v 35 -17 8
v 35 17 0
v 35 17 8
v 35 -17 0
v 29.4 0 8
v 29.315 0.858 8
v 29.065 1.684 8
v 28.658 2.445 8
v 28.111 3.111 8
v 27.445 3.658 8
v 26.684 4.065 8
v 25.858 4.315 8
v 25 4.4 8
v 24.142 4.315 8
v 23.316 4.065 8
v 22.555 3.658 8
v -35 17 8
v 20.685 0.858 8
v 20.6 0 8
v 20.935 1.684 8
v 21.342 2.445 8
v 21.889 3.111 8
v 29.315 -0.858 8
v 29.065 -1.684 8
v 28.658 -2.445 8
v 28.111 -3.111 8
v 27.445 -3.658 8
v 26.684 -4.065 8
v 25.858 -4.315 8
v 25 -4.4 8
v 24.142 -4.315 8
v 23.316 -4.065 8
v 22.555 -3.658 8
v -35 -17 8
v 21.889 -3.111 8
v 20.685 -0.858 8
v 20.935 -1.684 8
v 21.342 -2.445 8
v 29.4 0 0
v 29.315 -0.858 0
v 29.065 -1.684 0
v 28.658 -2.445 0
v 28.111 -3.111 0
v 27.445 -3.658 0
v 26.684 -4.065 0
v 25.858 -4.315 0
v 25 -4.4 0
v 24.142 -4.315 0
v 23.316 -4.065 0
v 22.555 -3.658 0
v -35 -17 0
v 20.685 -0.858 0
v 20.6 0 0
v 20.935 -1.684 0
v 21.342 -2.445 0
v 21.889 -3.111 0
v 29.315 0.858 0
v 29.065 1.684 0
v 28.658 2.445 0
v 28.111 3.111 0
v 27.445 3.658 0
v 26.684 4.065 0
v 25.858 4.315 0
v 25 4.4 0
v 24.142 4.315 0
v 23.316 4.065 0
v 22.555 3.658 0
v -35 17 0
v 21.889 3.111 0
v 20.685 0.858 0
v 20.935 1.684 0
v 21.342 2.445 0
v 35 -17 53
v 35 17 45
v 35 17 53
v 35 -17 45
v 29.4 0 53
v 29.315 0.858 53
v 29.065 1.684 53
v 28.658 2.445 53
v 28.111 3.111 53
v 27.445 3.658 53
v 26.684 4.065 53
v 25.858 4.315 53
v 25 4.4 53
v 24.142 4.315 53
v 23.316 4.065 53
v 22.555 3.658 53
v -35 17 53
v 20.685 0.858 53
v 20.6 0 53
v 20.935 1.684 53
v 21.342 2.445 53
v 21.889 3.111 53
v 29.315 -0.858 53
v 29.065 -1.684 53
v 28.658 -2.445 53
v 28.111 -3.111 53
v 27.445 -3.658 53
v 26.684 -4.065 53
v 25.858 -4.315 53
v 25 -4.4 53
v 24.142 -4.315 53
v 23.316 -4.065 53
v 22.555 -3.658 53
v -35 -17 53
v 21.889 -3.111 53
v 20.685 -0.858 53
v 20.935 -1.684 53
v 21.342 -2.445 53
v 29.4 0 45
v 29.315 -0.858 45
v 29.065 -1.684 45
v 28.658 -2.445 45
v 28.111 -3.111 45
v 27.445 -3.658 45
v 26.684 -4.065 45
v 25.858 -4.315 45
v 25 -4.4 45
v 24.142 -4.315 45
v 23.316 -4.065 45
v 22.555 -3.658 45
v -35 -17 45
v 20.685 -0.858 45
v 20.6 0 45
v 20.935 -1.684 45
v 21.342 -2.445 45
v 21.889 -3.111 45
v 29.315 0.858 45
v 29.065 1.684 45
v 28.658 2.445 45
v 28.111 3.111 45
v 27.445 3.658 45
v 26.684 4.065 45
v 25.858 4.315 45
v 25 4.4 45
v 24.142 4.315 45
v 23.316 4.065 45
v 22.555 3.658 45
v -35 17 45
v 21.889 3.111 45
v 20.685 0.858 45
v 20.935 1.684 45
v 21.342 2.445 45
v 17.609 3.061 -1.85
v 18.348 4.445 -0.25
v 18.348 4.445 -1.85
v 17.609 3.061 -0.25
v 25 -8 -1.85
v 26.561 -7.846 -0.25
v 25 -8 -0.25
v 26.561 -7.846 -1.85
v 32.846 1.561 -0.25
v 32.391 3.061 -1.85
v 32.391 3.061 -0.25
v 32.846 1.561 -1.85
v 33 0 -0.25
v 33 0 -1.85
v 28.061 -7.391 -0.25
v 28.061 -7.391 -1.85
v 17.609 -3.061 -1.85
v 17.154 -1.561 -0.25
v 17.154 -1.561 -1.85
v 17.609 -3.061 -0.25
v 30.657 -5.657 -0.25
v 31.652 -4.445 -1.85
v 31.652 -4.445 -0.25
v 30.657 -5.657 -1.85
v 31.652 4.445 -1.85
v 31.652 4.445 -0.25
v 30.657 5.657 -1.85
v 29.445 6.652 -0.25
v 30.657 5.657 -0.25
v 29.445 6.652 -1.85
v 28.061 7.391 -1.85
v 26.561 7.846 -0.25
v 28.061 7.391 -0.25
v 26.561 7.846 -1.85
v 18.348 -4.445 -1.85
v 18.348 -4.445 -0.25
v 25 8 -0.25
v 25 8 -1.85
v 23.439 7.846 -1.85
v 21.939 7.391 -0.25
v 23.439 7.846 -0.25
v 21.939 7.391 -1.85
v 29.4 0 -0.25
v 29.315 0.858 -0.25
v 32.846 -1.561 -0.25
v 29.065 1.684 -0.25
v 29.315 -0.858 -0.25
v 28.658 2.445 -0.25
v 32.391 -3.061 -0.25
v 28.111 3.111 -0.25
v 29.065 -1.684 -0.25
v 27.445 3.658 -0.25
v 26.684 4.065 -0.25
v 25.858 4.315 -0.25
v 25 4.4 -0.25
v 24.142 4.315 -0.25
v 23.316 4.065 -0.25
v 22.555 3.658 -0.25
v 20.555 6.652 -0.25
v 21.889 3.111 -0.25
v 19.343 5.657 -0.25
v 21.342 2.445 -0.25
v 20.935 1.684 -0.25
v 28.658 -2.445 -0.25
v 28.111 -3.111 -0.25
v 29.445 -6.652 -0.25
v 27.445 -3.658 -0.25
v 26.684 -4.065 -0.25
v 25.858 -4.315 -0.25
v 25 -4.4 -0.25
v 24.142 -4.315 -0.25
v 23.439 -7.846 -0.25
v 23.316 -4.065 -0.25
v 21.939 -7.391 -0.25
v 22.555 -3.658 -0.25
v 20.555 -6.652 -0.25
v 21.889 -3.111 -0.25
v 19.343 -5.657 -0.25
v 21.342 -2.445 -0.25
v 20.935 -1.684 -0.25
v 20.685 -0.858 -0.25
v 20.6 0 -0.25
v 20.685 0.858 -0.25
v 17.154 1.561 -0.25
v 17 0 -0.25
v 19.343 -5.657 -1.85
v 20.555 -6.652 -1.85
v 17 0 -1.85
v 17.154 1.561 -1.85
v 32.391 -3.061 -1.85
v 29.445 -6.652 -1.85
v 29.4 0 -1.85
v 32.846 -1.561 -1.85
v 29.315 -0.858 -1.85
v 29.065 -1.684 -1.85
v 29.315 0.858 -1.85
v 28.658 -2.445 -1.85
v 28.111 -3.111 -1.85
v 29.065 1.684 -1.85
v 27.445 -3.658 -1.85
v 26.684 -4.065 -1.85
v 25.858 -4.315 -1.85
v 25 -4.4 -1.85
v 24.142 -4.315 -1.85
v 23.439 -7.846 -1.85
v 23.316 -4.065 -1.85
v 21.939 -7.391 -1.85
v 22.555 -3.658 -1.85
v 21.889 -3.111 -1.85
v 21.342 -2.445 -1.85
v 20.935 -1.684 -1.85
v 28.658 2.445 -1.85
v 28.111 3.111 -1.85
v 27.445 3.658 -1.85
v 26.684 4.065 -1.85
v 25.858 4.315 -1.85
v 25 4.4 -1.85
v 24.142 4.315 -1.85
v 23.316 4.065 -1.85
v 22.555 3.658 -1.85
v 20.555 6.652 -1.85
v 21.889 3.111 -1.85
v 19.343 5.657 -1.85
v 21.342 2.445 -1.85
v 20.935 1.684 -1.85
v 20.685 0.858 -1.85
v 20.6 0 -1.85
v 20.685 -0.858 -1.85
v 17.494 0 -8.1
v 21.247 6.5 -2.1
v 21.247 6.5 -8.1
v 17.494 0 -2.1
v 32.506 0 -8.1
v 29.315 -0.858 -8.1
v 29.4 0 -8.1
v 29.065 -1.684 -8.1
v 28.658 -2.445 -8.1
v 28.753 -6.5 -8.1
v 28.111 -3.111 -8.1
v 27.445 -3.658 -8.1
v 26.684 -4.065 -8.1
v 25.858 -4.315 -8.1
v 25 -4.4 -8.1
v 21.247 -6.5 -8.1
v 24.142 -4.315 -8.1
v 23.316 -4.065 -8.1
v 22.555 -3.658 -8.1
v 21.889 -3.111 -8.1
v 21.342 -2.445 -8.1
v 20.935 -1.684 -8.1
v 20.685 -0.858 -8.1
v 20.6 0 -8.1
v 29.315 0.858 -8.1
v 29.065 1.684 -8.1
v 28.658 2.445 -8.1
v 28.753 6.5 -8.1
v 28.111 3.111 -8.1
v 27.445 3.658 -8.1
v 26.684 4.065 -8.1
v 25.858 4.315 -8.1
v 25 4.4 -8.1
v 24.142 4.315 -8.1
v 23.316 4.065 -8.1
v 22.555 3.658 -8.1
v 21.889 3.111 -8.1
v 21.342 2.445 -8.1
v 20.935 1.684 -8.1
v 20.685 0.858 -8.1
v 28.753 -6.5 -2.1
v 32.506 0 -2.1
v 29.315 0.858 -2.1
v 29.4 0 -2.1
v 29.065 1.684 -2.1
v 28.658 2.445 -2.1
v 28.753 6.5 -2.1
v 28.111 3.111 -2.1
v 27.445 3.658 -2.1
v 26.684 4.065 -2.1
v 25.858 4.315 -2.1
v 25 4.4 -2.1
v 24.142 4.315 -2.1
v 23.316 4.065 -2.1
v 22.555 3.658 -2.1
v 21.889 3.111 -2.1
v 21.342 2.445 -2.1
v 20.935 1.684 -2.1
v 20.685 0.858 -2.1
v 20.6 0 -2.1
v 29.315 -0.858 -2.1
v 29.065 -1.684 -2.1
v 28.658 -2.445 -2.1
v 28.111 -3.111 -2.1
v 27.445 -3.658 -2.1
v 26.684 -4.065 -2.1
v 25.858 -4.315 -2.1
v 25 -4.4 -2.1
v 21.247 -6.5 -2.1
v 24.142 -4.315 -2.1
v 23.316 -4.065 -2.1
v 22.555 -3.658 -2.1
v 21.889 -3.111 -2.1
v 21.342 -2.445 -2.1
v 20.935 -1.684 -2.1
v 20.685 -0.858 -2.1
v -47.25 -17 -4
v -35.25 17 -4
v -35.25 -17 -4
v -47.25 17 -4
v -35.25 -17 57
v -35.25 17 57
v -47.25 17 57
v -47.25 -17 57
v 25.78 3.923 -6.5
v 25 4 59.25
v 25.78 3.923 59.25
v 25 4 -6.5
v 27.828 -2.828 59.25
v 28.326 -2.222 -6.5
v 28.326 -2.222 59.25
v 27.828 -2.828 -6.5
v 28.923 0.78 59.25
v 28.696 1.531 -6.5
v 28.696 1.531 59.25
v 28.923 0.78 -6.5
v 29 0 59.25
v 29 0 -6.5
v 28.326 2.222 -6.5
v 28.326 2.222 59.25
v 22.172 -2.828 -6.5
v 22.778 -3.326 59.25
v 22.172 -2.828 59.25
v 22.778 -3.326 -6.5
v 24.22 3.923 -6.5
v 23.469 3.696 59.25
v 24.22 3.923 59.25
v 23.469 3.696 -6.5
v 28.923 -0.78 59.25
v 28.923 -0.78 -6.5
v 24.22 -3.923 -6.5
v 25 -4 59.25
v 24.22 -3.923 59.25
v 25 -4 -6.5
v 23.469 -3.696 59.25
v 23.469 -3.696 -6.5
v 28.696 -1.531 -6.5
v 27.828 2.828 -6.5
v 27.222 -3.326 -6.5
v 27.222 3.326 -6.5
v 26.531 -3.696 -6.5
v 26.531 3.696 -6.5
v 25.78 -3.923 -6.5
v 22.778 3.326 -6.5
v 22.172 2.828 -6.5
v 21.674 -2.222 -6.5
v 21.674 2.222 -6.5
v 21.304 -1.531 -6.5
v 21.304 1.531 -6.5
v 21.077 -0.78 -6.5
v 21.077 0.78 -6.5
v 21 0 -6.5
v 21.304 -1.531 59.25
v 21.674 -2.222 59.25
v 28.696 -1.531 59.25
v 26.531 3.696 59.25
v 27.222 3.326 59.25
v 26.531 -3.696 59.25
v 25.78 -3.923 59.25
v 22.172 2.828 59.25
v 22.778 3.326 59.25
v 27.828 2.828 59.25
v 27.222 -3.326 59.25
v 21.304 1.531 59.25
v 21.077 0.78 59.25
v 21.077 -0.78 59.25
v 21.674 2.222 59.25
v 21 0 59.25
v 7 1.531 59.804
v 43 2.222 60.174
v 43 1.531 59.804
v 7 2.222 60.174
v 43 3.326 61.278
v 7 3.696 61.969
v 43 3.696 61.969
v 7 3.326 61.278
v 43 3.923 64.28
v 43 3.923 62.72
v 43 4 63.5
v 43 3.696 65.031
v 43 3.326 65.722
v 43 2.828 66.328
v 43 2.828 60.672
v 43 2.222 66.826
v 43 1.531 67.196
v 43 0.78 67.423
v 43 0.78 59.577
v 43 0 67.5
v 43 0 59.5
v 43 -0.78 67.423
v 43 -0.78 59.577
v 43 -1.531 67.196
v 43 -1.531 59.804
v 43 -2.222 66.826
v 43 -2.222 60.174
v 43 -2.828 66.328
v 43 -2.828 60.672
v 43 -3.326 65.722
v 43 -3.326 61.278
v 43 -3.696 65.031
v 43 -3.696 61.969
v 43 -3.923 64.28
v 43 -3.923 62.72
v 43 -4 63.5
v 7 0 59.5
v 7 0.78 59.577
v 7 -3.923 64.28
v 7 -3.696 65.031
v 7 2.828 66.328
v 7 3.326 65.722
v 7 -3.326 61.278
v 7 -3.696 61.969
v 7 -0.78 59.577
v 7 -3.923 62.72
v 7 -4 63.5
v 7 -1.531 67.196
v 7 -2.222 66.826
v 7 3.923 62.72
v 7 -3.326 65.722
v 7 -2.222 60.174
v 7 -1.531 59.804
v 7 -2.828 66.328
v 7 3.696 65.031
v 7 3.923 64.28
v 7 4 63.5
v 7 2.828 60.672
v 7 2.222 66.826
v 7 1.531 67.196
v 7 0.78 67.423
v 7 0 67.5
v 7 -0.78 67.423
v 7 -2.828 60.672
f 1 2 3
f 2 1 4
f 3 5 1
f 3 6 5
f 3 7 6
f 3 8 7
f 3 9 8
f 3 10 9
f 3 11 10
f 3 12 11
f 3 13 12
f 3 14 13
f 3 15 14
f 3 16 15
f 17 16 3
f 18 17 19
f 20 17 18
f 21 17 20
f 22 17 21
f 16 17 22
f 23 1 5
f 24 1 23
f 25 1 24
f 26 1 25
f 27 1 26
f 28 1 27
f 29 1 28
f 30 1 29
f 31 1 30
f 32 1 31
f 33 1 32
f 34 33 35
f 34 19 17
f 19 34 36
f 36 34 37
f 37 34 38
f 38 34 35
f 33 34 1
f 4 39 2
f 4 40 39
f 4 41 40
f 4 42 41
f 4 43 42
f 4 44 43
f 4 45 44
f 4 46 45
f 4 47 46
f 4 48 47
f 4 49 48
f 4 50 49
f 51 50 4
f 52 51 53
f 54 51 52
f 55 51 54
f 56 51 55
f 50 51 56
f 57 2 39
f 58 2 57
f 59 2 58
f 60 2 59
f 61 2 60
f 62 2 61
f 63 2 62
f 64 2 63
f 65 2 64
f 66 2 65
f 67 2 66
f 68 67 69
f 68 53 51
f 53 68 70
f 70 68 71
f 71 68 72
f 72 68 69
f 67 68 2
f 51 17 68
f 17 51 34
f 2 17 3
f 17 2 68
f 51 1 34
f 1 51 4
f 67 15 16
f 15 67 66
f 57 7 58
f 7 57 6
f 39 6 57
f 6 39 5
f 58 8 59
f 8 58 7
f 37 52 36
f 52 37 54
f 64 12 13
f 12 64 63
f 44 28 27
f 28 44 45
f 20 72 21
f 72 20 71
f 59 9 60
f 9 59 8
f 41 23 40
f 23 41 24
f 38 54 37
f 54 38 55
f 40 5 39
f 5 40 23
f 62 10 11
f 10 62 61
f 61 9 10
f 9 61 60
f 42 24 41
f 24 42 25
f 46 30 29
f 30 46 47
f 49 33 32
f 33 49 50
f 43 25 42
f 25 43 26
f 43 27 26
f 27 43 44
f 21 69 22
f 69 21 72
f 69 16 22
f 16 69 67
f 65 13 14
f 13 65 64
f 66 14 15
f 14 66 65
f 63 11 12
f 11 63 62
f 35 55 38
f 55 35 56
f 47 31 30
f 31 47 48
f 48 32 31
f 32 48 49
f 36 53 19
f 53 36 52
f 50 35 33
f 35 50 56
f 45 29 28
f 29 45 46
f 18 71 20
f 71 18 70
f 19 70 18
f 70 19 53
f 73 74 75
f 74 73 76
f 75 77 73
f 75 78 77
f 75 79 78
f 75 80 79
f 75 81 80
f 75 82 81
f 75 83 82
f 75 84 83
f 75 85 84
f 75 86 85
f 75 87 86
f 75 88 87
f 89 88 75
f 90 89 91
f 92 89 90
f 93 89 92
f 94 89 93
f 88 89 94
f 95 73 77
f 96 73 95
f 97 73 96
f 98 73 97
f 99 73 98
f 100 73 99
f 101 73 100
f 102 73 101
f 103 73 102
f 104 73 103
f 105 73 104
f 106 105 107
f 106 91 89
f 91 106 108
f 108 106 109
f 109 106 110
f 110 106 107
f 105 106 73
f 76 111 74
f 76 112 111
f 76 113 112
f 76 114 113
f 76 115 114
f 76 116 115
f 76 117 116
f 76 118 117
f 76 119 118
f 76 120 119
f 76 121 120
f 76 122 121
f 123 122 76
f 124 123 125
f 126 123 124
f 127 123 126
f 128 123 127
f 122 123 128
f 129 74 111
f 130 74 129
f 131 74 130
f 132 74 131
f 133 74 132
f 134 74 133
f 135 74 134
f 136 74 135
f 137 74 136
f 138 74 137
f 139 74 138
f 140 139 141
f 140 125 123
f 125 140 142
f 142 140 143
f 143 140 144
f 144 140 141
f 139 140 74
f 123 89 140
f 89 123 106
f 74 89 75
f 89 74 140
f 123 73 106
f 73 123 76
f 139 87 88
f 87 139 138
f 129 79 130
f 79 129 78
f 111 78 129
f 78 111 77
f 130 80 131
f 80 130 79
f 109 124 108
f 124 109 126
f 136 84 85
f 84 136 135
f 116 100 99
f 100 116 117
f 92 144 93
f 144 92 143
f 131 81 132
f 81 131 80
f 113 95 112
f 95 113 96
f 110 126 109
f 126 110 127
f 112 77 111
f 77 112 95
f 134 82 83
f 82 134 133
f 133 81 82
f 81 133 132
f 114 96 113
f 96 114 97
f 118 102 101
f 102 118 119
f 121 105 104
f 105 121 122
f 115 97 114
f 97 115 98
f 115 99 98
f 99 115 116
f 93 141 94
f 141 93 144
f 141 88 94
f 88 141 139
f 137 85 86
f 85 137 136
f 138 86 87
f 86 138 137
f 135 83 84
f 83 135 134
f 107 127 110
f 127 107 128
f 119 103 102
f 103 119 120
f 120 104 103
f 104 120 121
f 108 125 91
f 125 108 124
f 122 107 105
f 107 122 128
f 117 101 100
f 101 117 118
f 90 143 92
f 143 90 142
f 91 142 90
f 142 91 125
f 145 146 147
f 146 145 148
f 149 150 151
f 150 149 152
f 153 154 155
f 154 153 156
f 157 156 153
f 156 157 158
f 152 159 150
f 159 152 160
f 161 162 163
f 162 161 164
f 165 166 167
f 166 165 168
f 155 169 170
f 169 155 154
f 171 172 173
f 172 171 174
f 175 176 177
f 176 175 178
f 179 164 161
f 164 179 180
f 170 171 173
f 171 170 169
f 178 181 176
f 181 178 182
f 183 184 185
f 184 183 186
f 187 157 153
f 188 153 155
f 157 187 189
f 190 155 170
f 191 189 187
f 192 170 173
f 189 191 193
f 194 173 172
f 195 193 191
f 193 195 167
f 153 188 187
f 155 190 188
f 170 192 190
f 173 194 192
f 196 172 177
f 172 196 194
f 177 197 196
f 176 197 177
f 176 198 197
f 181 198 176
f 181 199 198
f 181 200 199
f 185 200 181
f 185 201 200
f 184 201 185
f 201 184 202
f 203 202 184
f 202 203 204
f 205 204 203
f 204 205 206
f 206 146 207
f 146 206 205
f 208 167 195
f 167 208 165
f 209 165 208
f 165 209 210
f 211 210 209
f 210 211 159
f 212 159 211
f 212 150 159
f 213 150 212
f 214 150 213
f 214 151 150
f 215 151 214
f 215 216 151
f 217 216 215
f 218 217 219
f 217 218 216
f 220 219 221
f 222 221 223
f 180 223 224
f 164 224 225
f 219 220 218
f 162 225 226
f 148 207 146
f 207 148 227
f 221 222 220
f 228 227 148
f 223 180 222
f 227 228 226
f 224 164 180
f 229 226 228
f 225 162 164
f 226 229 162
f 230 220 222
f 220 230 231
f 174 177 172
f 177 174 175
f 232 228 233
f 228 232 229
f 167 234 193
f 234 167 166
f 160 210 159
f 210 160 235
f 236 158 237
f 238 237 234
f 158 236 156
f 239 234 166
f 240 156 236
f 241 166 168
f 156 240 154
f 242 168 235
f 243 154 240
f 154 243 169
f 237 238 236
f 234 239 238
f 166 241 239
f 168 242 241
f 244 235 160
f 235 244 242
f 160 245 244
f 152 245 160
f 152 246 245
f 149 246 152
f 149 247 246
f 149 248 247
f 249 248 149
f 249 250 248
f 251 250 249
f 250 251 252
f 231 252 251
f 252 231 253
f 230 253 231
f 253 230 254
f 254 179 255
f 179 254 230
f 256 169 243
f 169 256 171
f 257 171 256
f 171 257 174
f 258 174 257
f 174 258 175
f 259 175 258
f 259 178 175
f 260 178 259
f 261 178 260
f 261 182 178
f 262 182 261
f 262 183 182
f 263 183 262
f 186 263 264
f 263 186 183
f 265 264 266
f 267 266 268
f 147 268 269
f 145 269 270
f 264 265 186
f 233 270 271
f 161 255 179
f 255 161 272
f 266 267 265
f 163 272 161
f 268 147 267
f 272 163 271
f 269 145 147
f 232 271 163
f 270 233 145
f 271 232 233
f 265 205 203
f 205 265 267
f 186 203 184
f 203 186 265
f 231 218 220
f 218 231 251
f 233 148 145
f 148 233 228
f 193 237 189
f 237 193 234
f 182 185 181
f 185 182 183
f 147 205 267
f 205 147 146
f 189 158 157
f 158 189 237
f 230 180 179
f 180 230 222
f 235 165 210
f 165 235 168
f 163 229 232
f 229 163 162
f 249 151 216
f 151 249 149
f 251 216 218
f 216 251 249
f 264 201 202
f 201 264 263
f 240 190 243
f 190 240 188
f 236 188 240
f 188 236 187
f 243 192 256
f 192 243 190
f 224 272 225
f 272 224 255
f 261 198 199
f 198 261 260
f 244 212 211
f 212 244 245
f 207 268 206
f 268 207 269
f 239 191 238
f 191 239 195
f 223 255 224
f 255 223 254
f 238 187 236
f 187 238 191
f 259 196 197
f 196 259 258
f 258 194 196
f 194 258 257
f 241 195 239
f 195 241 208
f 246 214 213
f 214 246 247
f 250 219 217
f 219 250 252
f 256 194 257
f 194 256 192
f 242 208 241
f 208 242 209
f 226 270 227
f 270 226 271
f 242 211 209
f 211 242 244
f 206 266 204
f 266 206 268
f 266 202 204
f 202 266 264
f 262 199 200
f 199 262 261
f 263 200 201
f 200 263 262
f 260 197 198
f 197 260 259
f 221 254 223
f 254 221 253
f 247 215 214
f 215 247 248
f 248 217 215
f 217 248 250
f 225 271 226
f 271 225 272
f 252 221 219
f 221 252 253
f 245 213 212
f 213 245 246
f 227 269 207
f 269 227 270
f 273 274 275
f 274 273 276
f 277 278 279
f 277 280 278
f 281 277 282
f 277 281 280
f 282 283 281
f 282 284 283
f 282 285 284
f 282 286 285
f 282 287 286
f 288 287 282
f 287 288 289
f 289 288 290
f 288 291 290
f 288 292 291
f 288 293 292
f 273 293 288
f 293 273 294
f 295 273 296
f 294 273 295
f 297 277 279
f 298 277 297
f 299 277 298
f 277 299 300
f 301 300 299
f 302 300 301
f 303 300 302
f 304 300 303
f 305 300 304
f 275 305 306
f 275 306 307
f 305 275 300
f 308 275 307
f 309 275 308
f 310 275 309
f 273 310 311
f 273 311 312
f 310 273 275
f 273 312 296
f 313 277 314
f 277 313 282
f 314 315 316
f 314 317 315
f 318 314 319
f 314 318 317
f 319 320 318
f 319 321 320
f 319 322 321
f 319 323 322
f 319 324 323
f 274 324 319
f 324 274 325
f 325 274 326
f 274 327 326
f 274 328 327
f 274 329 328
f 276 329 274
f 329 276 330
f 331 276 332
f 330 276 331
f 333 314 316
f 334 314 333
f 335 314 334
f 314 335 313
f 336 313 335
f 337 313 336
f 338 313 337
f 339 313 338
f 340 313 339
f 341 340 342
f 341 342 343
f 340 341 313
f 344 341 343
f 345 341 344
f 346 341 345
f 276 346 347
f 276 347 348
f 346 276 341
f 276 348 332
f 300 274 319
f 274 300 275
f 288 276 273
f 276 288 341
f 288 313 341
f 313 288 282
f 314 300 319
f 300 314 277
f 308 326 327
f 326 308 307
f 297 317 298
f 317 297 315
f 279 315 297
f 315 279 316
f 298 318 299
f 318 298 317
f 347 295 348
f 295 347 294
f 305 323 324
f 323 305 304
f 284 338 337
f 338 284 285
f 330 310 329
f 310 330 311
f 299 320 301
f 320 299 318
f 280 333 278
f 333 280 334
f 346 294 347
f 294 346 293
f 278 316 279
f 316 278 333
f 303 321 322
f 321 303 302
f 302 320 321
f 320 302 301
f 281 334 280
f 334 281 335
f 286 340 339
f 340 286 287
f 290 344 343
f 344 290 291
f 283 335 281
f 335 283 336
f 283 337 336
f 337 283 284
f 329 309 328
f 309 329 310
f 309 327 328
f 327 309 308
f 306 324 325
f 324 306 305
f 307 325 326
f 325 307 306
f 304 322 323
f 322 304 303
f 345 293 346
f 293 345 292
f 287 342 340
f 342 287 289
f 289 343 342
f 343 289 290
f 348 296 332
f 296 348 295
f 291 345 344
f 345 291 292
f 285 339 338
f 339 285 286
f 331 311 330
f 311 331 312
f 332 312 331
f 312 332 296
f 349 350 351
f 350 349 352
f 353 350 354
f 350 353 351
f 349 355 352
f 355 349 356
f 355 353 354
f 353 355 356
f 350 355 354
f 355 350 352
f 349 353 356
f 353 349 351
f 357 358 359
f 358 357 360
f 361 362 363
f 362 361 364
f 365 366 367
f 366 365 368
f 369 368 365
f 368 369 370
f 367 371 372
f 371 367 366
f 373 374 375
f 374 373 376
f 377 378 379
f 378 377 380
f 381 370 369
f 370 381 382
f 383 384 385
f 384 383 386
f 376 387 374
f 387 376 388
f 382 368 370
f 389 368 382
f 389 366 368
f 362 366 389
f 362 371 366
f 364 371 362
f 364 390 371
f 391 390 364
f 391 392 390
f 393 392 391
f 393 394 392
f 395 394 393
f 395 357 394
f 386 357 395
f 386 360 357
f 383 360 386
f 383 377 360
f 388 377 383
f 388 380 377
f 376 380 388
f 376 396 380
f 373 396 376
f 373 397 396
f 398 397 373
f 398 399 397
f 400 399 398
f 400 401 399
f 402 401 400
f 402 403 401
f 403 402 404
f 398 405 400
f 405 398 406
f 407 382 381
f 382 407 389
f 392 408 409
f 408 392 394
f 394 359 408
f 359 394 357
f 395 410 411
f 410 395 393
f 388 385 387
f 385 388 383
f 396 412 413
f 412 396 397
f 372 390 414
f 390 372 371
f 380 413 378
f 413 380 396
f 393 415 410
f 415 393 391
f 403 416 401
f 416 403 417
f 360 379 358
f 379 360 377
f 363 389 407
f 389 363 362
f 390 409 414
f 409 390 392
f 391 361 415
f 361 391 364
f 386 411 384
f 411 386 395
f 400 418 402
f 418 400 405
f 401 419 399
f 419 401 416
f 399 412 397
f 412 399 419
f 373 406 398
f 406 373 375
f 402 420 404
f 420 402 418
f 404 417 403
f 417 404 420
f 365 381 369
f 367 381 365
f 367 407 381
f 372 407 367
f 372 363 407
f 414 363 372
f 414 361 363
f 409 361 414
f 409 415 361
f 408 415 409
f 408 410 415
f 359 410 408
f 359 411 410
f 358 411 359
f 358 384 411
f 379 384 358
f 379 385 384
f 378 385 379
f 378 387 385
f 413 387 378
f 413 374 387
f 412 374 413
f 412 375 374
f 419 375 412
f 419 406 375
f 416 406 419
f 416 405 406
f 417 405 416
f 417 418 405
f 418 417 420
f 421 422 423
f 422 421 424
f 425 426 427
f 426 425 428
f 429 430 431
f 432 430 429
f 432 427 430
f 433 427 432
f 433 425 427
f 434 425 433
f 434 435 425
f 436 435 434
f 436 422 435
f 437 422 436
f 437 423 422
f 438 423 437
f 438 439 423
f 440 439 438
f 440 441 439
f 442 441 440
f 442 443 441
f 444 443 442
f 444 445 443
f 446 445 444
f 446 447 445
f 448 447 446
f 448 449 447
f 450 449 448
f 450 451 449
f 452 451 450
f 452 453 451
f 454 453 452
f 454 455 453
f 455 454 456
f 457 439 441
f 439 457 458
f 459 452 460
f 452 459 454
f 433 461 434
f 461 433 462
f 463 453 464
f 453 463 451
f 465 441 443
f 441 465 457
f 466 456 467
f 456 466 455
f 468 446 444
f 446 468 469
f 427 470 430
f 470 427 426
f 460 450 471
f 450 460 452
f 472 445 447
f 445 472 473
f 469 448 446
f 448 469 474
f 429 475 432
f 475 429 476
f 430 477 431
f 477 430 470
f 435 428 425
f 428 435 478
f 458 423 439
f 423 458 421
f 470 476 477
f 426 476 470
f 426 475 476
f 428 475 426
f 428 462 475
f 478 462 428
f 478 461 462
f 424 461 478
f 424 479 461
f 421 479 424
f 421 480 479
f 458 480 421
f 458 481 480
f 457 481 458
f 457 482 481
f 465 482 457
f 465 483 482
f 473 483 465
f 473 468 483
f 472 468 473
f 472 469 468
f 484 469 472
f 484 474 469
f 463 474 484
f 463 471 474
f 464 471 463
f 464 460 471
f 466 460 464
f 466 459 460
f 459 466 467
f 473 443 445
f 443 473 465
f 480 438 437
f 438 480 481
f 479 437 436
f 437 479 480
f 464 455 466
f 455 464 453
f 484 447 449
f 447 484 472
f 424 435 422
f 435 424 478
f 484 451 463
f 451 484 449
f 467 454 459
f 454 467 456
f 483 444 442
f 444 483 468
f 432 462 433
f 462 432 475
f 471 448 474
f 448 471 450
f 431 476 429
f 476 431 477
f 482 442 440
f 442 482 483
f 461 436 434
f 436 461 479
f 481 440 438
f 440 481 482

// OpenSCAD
$fn = 32;

// ------------------------------------------------------------------------
// C clamp: throat 45 mm, screw d8
// Every part is its own module, assembly() places every instance.
// ------------------------------------------------------------------------

// --- part 1 ---
module clamp_arm() {
  difference() {
    translate([-35, -17, 0]) cube([70, 34, 8]);
    translate([25, 0, -1]) cylinder(h = 10, d = 8.8);
  }
}

// --- part 2 ---
module clamp_spine() {
  difference() {
    translate([-30.5, -17, 0]) cube([61, 34, 12]);
  }
}

// --- part 3 ---
module clamp_screw() {
  translate([0, 0, -32.875]) cylinder(h = 65.75, d = 8);
}

// --- part 4 ---
module clamp_washer() {
  difference() {
      translate([0, 0, 0]) cylinder(h = 1.6, d = 16);
      translate([0, 0, -1]) cylinder(h = 3.6, d = 8.8);
    }
}

// --- part 5 ---
module clamp_nut() {
  difference() {
    linear_extrude(height = 6) polygon(points = [[7.506, 0], [3.753, 6.5], [-3.753, 6.5], [-7.506, 0], [-3.753, -6.5], [3.753, -6.5]]);
    translate([0, 0, -1]) cylinder(h = 8, d = 8.8);
  }
}

// --- part 6 ---
module tommy_bar() {
  translate([0, 0, -18]) cylinder(h = 36, d = 8);
}

// --- assembly ---
module assembly() {
  color([0.80, 0.24, 0.20]) translate([0, 0, 0]) rotate([0, 0, 0]) clamp_arm();
  color([0.20, 0.45, 0.75]) translate([0, 0, 45]) rotate([0, 0, 0]) clamp_arm();
  color([0.25, 0.62, 0.32]) translate([-47.25, 0, 26.5]) rotate([0, 90, 0]) clamp_spine();
  color([0.92, 0.70, 0.18]) translate([25, 0, 26.375]) rotate([0, 0, 0]) clamp_screw();
  color([0.58, 0.35, 0.70]) translate([25, 0, -1.85]) rotate([0, 0, 0]) clamp_washer();
  color([0.16, 0.66, 0.66]) translate([25, 0, -8.1]) rotate([0, 0, 0]) clamp_nut();
  color([0.85, 0.48, 0.18]) translate([25, 0, 63.5]) rotate([0, 90, 0]) tommy_bar();
}

assembly();
